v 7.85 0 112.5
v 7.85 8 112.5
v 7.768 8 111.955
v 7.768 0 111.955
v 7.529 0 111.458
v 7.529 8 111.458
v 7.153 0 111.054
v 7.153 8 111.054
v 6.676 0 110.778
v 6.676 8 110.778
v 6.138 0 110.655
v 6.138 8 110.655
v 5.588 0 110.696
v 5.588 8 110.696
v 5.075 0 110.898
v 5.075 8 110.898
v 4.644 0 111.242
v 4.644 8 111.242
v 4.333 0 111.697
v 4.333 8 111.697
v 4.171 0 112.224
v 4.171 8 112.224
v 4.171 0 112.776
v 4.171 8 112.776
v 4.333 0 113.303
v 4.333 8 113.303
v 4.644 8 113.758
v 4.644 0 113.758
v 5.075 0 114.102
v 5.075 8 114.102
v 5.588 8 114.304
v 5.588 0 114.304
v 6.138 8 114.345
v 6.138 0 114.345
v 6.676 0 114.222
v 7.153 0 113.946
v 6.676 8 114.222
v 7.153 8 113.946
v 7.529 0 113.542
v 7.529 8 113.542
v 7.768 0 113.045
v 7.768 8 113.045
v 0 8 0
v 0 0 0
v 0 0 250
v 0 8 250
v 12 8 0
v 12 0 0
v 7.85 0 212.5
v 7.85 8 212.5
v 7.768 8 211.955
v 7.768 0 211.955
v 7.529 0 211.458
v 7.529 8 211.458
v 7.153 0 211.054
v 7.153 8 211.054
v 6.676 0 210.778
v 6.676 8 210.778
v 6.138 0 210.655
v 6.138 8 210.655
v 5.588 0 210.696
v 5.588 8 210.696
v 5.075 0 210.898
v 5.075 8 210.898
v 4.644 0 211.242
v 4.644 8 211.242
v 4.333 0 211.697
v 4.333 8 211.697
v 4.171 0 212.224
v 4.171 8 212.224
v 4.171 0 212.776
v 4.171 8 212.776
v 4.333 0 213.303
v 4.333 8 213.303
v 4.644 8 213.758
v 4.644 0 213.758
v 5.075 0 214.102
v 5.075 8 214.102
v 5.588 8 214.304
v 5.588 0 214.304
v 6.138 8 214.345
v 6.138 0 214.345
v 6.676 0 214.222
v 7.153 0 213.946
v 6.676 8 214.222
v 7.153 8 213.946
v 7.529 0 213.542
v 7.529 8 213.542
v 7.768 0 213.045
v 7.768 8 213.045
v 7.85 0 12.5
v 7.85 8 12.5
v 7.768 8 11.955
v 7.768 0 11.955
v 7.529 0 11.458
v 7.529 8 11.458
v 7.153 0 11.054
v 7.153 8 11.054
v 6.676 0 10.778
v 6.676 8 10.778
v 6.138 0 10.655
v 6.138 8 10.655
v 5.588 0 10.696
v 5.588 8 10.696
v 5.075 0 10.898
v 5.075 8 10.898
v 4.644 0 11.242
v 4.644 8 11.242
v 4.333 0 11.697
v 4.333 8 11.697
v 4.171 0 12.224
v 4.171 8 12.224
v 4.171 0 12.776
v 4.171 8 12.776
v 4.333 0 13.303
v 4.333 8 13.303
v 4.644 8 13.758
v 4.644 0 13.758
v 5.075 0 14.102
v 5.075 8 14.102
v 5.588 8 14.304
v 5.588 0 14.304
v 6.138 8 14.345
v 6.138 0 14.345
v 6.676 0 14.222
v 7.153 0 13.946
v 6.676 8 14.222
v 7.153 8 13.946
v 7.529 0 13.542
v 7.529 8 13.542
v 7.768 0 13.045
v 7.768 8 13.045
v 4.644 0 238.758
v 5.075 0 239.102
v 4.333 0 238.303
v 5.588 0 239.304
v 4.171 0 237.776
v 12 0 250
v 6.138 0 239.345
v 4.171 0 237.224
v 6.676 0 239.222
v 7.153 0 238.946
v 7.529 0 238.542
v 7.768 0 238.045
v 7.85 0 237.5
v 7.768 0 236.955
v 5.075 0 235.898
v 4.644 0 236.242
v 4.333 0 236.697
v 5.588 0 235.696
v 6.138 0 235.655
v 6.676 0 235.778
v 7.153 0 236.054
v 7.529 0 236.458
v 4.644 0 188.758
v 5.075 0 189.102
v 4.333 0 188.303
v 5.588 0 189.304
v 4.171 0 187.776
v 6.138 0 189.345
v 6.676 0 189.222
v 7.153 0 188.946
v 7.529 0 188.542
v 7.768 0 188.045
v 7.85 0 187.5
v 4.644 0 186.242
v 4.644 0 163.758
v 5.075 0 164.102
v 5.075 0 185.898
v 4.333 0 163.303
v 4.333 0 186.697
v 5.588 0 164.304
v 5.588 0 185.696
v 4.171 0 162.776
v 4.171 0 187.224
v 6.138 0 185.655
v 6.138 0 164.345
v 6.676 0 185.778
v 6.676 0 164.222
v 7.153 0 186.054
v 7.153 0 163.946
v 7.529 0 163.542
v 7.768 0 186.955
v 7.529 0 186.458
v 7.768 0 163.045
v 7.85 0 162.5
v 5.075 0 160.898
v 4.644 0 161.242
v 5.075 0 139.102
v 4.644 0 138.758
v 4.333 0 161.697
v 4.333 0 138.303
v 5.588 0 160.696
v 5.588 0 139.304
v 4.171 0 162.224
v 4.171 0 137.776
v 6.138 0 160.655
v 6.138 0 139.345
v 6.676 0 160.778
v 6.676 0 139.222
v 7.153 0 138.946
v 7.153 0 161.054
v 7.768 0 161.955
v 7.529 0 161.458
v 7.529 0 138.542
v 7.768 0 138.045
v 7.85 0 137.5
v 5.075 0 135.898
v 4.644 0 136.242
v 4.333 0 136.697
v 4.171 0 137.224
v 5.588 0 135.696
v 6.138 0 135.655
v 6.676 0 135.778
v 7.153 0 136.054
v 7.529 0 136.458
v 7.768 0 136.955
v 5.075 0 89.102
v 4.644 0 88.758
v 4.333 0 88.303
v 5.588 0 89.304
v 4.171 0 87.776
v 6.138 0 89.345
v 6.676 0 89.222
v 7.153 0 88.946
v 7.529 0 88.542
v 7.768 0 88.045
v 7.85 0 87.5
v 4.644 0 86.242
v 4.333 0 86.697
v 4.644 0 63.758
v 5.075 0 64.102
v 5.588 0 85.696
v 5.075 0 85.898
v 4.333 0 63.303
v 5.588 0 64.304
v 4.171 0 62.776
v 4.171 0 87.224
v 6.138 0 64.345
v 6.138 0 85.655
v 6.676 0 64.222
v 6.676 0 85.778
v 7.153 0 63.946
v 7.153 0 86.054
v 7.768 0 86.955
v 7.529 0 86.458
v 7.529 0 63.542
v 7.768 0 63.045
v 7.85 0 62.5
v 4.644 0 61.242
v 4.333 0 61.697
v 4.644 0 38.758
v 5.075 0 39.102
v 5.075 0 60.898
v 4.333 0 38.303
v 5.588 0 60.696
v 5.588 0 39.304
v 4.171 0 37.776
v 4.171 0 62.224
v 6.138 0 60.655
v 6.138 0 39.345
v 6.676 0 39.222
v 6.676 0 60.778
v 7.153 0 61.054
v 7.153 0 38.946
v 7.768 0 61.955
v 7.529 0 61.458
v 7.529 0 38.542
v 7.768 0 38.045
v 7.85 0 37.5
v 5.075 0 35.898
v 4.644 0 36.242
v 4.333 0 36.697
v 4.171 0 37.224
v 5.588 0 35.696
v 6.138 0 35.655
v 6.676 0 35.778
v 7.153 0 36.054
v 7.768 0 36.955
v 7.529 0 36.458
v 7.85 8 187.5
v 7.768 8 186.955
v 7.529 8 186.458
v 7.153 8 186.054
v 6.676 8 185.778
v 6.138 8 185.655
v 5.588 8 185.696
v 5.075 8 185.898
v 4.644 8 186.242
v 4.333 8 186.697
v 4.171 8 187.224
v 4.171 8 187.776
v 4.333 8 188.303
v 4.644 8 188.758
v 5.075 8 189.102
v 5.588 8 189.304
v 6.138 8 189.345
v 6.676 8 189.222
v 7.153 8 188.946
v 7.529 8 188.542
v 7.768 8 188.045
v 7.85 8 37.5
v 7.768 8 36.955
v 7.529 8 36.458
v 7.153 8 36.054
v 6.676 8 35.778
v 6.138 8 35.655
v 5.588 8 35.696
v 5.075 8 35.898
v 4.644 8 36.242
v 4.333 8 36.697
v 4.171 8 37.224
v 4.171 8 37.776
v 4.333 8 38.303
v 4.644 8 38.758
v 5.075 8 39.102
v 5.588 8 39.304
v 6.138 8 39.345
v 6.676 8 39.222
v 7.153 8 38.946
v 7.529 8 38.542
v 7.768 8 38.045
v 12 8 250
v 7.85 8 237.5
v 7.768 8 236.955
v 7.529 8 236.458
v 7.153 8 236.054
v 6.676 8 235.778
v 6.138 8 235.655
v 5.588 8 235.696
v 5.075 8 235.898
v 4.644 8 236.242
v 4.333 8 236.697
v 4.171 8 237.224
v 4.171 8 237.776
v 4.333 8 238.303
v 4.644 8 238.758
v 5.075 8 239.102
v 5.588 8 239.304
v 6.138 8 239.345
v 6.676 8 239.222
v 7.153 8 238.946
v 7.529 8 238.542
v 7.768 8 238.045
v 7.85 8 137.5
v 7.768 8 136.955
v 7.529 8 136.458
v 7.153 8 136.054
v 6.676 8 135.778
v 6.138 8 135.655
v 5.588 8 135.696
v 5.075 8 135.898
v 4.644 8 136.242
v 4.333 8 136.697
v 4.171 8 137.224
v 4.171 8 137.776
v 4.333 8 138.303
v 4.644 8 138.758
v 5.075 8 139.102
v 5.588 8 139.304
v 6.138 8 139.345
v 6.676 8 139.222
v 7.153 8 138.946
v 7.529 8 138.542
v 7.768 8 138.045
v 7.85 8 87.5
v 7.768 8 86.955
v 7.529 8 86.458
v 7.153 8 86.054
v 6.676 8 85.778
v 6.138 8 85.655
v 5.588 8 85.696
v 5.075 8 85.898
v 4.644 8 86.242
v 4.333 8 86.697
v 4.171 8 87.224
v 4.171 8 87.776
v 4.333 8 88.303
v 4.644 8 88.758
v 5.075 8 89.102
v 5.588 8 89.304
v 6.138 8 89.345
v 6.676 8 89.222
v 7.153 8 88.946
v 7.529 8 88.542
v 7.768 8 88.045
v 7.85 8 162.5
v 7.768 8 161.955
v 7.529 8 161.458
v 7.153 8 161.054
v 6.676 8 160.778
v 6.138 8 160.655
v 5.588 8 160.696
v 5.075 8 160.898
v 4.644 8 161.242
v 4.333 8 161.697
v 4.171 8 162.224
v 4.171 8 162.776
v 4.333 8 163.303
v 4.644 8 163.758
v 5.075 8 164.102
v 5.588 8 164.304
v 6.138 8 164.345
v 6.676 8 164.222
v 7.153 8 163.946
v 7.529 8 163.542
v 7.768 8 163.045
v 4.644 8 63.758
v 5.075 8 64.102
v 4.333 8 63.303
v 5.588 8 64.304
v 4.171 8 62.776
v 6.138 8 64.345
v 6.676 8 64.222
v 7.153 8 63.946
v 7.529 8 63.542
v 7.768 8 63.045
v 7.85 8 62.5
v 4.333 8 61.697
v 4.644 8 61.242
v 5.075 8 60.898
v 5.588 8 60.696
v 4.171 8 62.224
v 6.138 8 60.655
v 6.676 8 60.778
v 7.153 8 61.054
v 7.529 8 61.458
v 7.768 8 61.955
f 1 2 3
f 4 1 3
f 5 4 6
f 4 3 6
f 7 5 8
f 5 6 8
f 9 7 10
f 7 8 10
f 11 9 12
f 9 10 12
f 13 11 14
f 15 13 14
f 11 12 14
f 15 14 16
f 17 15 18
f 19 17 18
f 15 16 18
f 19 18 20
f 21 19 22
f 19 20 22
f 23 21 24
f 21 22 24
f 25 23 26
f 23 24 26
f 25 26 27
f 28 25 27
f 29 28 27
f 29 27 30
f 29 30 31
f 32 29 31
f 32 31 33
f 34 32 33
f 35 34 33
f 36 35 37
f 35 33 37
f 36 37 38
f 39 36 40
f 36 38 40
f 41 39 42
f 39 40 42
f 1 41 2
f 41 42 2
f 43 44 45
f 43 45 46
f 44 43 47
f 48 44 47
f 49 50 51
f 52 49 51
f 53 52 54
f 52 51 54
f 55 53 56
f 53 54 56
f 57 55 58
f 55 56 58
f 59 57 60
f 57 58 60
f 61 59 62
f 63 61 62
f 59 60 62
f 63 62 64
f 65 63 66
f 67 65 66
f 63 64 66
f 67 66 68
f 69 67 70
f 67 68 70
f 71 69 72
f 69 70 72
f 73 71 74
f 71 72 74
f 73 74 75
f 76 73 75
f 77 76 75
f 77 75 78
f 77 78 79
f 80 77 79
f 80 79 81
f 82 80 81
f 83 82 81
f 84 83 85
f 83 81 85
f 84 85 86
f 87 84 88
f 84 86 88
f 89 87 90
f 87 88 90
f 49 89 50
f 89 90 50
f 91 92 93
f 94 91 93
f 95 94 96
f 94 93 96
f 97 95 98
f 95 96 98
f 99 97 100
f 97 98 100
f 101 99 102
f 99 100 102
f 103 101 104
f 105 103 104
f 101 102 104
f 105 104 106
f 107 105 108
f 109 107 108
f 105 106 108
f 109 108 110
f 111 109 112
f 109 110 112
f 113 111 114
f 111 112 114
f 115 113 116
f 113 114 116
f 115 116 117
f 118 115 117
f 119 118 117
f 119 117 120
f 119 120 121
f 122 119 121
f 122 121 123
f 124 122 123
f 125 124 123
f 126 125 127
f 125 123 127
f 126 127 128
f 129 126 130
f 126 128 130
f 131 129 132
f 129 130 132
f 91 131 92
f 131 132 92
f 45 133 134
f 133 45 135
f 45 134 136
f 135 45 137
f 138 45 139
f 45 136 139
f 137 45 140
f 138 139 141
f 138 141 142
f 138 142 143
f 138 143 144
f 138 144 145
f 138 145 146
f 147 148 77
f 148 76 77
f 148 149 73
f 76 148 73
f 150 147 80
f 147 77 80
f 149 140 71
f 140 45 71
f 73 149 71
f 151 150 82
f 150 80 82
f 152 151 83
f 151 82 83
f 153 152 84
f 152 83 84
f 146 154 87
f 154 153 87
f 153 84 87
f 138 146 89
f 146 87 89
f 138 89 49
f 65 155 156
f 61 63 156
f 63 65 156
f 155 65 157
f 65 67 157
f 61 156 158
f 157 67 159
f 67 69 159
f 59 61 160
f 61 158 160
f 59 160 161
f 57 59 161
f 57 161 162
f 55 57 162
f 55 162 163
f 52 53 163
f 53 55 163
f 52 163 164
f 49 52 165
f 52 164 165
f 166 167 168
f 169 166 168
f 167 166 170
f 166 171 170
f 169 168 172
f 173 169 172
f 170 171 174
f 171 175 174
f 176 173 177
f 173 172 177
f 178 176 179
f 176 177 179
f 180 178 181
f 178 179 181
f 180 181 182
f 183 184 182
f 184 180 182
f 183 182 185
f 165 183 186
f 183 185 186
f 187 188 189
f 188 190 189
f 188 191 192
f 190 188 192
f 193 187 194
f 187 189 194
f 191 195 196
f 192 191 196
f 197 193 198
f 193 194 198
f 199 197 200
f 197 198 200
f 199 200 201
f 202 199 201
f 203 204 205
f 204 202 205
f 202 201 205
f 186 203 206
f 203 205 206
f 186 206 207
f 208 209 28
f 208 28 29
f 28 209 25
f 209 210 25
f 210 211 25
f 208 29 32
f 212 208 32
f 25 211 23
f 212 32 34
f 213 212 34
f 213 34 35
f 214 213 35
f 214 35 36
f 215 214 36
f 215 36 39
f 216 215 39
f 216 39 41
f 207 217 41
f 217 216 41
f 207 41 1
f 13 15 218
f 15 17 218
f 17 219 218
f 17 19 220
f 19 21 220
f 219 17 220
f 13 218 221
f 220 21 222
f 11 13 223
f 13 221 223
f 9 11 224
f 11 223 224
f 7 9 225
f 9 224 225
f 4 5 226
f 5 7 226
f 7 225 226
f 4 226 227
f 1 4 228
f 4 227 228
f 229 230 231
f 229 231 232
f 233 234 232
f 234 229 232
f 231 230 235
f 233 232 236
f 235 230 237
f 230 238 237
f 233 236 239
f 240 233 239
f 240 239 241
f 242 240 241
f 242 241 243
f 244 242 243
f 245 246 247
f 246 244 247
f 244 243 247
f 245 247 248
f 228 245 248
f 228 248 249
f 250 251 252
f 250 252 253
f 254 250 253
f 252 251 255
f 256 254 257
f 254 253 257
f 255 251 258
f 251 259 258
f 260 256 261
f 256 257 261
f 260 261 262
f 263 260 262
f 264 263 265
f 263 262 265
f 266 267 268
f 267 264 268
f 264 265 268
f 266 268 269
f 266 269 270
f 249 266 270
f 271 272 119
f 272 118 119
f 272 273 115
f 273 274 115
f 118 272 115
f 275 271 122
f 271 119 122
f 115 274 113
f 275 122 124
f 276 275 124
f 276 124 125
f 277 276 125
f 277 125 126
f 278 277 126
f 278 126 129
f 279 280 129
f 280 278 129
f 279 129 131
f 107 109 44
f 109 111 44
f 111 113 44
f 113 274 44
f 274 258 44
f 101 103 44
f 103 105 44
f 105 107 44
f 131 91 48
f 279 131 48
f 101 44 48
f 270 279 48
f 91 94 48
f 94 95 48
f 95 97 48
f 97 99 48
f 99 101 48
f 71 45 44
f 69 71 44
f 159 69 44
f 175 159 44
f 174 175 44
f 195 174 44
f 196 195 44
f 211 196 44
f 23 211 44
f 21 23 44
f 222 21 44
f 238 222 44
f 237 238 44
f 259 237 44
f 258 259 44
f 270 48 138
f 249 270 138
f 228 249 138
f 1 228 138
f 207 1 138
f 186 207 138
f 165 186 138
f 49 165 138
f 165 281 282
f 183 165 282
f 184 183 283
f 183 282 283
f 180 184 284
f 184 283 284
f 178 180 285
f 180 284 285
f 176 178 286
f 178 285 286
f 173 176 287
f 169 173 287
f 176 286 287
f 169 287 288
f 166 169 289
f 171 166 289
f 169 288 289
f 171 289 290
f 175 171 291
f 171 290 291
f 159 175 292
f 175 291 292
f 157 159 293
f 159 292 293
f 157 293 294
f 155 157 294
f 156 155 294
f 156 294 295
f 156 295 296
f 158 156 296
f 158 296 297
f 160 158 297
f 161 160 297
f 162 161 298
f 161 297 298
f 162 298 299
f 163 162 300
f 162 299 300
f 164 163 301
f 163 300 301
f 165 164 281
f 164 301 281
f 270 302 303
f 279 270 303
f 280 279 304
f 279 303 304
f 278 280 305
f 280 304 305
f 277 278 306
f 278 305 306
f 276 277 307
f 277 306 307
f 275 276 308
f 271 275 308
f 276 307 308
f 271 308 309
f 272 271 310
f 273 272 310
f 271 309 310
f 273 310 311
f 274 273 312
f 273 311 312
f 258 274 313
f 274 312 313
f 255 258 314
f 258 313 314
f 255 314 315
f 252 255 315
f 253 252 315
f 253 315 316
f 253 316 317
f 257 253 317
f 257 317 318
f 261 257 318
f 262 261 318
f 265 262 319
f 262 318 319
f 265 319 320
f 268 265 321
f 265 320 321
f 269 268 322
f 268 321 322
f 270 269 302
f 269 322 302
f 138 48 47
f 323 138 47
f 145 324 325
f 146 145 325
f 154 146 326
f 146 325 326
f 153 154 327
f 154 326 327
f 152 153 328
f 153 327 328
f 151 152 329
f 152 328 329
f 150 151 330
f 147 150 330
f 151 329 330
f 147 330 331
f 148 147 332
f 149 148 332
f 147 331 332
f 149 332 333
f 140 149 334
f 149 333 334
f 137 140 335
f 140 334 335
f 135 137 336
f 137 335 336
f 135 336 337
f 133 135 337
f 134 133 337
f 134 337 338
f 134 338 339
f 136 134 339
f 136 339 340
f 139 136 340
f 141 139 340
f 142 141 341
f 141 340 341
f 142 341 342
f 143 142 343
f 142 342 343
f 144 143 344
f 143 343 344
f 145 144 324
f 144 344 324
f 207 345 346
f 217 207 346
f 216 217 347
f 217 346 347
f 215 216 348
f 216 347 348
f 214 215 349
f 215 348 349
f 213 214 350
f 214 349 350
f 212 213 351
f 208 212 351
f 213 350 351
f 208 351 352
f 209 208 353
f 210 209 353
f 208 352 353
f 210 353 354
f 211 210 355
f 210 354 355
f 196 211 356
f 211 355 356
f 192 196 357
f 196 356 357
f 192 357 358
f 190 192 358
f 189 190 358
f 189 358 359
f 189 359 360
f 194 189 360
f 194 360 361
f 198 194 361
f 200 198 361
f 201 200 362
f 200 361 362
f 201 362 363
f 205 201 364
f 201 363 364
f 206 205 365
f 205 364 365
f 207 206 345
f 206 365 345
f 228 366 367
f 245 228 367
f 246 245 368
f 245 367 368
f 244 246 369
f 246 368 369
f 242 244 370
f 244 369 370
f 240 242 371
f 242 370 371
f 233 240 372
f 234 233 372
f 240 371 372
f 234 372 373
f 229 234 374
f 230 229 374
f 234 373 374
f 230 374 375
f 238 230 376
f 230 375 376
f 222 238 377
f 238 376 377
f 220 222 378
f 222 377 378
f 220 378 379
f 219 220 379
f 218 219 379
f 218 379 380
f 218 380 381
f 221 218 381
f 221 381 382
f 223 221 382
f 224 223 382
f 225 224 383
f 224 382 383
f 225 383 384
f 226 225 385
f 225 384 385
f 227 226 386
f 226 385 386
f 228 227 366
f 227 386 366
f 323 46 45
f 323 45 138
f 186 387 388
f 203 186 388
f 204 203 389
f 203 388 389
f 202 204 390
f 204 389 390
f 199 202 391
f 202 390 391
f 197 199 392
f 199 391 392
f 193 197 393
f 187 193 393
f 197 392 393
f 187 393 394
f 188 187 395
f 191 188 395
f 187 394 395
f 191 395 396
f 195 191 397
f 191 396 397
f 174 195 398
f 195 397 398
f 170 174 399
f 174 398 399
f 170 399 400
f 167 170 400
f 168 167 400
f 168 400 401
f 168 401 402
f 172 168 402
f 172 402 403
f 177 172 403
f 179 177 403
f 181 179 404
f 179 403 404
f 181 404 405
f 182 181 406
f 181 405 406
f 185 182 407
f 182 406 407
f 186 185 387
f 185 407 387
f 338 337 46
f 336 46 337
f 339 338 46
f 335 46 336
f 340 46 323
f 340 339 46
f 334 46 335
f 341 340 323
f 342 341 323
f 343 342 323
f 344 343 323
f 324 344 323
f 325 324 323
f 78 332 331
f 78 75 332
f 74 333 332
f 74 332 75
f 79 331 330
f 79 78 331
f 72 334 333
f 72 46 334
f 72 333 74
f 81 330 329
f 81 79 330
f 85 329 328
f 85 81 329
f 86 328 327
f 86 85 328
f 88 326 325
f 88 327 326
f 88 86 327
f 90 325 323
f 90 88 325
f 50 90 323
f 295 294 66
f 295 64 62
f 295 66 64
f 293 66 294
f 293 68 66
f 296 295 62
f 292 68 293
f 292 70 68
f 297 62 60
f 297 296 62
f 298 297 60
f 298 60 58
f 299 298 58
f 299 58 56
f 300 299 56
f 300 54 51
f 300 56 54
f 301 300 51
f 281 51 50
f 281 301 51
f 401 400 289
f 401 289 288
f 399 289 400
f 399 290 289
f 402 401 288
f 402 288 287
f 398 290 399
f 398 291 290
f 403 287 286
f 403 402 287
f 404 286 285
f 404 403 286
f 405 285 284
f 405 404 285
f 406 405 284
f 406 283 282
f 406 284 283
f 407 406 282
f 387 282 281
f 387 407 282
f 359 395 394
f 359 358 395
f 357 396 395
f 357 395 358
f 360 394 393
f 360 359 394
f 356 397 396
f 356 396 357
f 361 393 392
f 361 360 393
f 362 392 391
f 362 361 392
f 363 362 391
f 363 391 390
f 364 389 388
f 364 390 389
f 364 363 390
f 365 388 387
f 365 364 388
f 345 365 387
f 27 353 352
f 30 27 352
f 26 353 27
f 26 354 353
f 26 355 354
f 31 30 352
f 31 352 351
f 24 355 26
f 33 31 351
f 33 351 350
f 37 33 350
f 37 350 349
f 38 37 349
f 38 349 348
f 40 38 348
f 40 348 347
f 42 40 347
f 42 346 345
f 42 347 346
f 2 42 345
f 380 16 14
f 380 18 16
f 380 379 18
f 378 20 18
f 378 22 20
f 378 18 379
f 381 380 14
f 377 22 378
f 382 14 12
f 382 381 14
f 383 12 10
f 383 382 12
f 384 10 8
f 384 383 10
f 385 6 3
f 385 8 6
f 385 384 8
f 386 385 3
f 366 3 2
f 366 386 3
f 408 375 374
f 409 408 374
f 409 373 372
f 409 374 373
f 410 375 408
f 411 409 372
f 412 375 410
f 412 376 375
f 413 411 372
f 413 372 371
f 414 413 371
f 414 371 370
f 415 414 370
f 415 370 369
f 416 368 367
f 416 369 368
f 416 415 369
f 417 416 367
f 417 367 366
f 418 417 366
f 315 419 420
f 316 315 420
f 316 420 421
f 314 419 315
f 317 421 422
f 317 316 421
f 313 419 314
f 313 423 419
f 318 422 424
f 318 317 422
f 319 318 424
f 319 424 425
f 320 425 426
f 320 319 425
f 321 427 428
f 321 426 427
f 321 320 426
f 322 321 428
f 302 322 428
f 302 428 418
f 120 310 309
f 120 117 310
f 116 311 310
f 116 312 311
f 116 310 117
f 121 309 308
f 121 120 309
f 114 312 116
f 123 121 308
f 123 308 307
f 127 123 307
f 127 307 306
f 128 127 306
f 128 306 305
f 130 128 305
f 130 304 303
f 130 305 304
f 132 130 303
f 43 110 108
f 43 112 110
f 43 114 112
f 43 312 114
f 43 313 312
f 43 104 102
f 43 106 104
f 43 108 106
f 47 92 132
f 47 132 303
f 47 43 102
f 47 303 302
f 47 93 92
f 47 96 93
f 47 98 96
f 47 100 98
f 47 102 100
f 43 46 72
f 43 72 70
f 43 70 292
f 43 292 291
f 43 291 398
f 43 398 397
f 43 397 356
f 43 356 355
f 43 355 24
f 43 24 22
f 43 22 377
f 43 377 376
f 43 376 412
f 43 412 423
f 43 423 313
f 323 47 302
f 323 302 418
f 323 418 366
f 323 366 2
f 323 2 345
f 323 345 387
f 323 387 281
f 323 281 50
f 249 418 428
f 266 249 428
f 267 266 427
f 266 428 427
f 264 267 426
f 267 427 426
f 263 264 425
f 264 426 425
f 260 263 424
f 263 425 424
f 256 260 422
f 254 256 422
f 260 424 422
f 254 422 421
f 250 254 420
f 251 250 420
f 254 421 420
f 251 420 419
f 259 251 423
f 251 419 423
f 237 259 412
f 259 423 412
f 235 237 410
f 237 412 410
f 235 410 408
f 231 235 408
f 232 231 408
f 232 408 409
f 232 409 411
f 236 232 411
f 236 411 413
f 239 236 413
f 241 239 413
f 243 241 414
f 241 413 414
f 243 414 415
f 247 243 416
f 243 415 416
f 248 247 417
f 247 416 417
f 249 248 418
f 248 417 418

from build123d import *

# Parameters (mm, degrees)
SKETCH3_W           = 12
SKETCH3_H           = 8
BOSS_EXTRUDE1_DEPTH = 250
SKETCH4_R           = 1.85
CUT_EXTRUDE1_DEPTH  = 8
LPATTERN1_COUNT     = 10
LPATTERN1_PITCH     = 25


with BuildPart() as part:
    # Sketch3 → Boss-Extrude1 (new body)
    with BuildSketch(Plane.XY):
        with Locations((6, 4)):
            Rectangle(SKETCH3_W, SKETCH3_H)
    extrude(amount=BOSS_EXTRUDE1_DEPTH)

    # Sketch4 → Cut-Extrude1 (cut)
    with BuildSketch(Plane(origin=(0, 8, 0), x_dir=(1, 0, 0), z_dir=(0, 1, 0))):
        with Locations((6, -237.5)):
            Circle(SKETCH4_R)
    cut_extrude1 = extrude(amount=-CUT_EXTRUDE1_DEPTH, mode=Mode.SUBTRACT)

    # LPattern1: Cut-Extrude1 ×10
    with Locations(*[(0, 0, -i * LPATTERN1_PITCH) for i in range(1, LPATTERN1_COUNT)]):
        add(cut_extrude1, mode=Mode.SUBTRACT)


solid = part.part
